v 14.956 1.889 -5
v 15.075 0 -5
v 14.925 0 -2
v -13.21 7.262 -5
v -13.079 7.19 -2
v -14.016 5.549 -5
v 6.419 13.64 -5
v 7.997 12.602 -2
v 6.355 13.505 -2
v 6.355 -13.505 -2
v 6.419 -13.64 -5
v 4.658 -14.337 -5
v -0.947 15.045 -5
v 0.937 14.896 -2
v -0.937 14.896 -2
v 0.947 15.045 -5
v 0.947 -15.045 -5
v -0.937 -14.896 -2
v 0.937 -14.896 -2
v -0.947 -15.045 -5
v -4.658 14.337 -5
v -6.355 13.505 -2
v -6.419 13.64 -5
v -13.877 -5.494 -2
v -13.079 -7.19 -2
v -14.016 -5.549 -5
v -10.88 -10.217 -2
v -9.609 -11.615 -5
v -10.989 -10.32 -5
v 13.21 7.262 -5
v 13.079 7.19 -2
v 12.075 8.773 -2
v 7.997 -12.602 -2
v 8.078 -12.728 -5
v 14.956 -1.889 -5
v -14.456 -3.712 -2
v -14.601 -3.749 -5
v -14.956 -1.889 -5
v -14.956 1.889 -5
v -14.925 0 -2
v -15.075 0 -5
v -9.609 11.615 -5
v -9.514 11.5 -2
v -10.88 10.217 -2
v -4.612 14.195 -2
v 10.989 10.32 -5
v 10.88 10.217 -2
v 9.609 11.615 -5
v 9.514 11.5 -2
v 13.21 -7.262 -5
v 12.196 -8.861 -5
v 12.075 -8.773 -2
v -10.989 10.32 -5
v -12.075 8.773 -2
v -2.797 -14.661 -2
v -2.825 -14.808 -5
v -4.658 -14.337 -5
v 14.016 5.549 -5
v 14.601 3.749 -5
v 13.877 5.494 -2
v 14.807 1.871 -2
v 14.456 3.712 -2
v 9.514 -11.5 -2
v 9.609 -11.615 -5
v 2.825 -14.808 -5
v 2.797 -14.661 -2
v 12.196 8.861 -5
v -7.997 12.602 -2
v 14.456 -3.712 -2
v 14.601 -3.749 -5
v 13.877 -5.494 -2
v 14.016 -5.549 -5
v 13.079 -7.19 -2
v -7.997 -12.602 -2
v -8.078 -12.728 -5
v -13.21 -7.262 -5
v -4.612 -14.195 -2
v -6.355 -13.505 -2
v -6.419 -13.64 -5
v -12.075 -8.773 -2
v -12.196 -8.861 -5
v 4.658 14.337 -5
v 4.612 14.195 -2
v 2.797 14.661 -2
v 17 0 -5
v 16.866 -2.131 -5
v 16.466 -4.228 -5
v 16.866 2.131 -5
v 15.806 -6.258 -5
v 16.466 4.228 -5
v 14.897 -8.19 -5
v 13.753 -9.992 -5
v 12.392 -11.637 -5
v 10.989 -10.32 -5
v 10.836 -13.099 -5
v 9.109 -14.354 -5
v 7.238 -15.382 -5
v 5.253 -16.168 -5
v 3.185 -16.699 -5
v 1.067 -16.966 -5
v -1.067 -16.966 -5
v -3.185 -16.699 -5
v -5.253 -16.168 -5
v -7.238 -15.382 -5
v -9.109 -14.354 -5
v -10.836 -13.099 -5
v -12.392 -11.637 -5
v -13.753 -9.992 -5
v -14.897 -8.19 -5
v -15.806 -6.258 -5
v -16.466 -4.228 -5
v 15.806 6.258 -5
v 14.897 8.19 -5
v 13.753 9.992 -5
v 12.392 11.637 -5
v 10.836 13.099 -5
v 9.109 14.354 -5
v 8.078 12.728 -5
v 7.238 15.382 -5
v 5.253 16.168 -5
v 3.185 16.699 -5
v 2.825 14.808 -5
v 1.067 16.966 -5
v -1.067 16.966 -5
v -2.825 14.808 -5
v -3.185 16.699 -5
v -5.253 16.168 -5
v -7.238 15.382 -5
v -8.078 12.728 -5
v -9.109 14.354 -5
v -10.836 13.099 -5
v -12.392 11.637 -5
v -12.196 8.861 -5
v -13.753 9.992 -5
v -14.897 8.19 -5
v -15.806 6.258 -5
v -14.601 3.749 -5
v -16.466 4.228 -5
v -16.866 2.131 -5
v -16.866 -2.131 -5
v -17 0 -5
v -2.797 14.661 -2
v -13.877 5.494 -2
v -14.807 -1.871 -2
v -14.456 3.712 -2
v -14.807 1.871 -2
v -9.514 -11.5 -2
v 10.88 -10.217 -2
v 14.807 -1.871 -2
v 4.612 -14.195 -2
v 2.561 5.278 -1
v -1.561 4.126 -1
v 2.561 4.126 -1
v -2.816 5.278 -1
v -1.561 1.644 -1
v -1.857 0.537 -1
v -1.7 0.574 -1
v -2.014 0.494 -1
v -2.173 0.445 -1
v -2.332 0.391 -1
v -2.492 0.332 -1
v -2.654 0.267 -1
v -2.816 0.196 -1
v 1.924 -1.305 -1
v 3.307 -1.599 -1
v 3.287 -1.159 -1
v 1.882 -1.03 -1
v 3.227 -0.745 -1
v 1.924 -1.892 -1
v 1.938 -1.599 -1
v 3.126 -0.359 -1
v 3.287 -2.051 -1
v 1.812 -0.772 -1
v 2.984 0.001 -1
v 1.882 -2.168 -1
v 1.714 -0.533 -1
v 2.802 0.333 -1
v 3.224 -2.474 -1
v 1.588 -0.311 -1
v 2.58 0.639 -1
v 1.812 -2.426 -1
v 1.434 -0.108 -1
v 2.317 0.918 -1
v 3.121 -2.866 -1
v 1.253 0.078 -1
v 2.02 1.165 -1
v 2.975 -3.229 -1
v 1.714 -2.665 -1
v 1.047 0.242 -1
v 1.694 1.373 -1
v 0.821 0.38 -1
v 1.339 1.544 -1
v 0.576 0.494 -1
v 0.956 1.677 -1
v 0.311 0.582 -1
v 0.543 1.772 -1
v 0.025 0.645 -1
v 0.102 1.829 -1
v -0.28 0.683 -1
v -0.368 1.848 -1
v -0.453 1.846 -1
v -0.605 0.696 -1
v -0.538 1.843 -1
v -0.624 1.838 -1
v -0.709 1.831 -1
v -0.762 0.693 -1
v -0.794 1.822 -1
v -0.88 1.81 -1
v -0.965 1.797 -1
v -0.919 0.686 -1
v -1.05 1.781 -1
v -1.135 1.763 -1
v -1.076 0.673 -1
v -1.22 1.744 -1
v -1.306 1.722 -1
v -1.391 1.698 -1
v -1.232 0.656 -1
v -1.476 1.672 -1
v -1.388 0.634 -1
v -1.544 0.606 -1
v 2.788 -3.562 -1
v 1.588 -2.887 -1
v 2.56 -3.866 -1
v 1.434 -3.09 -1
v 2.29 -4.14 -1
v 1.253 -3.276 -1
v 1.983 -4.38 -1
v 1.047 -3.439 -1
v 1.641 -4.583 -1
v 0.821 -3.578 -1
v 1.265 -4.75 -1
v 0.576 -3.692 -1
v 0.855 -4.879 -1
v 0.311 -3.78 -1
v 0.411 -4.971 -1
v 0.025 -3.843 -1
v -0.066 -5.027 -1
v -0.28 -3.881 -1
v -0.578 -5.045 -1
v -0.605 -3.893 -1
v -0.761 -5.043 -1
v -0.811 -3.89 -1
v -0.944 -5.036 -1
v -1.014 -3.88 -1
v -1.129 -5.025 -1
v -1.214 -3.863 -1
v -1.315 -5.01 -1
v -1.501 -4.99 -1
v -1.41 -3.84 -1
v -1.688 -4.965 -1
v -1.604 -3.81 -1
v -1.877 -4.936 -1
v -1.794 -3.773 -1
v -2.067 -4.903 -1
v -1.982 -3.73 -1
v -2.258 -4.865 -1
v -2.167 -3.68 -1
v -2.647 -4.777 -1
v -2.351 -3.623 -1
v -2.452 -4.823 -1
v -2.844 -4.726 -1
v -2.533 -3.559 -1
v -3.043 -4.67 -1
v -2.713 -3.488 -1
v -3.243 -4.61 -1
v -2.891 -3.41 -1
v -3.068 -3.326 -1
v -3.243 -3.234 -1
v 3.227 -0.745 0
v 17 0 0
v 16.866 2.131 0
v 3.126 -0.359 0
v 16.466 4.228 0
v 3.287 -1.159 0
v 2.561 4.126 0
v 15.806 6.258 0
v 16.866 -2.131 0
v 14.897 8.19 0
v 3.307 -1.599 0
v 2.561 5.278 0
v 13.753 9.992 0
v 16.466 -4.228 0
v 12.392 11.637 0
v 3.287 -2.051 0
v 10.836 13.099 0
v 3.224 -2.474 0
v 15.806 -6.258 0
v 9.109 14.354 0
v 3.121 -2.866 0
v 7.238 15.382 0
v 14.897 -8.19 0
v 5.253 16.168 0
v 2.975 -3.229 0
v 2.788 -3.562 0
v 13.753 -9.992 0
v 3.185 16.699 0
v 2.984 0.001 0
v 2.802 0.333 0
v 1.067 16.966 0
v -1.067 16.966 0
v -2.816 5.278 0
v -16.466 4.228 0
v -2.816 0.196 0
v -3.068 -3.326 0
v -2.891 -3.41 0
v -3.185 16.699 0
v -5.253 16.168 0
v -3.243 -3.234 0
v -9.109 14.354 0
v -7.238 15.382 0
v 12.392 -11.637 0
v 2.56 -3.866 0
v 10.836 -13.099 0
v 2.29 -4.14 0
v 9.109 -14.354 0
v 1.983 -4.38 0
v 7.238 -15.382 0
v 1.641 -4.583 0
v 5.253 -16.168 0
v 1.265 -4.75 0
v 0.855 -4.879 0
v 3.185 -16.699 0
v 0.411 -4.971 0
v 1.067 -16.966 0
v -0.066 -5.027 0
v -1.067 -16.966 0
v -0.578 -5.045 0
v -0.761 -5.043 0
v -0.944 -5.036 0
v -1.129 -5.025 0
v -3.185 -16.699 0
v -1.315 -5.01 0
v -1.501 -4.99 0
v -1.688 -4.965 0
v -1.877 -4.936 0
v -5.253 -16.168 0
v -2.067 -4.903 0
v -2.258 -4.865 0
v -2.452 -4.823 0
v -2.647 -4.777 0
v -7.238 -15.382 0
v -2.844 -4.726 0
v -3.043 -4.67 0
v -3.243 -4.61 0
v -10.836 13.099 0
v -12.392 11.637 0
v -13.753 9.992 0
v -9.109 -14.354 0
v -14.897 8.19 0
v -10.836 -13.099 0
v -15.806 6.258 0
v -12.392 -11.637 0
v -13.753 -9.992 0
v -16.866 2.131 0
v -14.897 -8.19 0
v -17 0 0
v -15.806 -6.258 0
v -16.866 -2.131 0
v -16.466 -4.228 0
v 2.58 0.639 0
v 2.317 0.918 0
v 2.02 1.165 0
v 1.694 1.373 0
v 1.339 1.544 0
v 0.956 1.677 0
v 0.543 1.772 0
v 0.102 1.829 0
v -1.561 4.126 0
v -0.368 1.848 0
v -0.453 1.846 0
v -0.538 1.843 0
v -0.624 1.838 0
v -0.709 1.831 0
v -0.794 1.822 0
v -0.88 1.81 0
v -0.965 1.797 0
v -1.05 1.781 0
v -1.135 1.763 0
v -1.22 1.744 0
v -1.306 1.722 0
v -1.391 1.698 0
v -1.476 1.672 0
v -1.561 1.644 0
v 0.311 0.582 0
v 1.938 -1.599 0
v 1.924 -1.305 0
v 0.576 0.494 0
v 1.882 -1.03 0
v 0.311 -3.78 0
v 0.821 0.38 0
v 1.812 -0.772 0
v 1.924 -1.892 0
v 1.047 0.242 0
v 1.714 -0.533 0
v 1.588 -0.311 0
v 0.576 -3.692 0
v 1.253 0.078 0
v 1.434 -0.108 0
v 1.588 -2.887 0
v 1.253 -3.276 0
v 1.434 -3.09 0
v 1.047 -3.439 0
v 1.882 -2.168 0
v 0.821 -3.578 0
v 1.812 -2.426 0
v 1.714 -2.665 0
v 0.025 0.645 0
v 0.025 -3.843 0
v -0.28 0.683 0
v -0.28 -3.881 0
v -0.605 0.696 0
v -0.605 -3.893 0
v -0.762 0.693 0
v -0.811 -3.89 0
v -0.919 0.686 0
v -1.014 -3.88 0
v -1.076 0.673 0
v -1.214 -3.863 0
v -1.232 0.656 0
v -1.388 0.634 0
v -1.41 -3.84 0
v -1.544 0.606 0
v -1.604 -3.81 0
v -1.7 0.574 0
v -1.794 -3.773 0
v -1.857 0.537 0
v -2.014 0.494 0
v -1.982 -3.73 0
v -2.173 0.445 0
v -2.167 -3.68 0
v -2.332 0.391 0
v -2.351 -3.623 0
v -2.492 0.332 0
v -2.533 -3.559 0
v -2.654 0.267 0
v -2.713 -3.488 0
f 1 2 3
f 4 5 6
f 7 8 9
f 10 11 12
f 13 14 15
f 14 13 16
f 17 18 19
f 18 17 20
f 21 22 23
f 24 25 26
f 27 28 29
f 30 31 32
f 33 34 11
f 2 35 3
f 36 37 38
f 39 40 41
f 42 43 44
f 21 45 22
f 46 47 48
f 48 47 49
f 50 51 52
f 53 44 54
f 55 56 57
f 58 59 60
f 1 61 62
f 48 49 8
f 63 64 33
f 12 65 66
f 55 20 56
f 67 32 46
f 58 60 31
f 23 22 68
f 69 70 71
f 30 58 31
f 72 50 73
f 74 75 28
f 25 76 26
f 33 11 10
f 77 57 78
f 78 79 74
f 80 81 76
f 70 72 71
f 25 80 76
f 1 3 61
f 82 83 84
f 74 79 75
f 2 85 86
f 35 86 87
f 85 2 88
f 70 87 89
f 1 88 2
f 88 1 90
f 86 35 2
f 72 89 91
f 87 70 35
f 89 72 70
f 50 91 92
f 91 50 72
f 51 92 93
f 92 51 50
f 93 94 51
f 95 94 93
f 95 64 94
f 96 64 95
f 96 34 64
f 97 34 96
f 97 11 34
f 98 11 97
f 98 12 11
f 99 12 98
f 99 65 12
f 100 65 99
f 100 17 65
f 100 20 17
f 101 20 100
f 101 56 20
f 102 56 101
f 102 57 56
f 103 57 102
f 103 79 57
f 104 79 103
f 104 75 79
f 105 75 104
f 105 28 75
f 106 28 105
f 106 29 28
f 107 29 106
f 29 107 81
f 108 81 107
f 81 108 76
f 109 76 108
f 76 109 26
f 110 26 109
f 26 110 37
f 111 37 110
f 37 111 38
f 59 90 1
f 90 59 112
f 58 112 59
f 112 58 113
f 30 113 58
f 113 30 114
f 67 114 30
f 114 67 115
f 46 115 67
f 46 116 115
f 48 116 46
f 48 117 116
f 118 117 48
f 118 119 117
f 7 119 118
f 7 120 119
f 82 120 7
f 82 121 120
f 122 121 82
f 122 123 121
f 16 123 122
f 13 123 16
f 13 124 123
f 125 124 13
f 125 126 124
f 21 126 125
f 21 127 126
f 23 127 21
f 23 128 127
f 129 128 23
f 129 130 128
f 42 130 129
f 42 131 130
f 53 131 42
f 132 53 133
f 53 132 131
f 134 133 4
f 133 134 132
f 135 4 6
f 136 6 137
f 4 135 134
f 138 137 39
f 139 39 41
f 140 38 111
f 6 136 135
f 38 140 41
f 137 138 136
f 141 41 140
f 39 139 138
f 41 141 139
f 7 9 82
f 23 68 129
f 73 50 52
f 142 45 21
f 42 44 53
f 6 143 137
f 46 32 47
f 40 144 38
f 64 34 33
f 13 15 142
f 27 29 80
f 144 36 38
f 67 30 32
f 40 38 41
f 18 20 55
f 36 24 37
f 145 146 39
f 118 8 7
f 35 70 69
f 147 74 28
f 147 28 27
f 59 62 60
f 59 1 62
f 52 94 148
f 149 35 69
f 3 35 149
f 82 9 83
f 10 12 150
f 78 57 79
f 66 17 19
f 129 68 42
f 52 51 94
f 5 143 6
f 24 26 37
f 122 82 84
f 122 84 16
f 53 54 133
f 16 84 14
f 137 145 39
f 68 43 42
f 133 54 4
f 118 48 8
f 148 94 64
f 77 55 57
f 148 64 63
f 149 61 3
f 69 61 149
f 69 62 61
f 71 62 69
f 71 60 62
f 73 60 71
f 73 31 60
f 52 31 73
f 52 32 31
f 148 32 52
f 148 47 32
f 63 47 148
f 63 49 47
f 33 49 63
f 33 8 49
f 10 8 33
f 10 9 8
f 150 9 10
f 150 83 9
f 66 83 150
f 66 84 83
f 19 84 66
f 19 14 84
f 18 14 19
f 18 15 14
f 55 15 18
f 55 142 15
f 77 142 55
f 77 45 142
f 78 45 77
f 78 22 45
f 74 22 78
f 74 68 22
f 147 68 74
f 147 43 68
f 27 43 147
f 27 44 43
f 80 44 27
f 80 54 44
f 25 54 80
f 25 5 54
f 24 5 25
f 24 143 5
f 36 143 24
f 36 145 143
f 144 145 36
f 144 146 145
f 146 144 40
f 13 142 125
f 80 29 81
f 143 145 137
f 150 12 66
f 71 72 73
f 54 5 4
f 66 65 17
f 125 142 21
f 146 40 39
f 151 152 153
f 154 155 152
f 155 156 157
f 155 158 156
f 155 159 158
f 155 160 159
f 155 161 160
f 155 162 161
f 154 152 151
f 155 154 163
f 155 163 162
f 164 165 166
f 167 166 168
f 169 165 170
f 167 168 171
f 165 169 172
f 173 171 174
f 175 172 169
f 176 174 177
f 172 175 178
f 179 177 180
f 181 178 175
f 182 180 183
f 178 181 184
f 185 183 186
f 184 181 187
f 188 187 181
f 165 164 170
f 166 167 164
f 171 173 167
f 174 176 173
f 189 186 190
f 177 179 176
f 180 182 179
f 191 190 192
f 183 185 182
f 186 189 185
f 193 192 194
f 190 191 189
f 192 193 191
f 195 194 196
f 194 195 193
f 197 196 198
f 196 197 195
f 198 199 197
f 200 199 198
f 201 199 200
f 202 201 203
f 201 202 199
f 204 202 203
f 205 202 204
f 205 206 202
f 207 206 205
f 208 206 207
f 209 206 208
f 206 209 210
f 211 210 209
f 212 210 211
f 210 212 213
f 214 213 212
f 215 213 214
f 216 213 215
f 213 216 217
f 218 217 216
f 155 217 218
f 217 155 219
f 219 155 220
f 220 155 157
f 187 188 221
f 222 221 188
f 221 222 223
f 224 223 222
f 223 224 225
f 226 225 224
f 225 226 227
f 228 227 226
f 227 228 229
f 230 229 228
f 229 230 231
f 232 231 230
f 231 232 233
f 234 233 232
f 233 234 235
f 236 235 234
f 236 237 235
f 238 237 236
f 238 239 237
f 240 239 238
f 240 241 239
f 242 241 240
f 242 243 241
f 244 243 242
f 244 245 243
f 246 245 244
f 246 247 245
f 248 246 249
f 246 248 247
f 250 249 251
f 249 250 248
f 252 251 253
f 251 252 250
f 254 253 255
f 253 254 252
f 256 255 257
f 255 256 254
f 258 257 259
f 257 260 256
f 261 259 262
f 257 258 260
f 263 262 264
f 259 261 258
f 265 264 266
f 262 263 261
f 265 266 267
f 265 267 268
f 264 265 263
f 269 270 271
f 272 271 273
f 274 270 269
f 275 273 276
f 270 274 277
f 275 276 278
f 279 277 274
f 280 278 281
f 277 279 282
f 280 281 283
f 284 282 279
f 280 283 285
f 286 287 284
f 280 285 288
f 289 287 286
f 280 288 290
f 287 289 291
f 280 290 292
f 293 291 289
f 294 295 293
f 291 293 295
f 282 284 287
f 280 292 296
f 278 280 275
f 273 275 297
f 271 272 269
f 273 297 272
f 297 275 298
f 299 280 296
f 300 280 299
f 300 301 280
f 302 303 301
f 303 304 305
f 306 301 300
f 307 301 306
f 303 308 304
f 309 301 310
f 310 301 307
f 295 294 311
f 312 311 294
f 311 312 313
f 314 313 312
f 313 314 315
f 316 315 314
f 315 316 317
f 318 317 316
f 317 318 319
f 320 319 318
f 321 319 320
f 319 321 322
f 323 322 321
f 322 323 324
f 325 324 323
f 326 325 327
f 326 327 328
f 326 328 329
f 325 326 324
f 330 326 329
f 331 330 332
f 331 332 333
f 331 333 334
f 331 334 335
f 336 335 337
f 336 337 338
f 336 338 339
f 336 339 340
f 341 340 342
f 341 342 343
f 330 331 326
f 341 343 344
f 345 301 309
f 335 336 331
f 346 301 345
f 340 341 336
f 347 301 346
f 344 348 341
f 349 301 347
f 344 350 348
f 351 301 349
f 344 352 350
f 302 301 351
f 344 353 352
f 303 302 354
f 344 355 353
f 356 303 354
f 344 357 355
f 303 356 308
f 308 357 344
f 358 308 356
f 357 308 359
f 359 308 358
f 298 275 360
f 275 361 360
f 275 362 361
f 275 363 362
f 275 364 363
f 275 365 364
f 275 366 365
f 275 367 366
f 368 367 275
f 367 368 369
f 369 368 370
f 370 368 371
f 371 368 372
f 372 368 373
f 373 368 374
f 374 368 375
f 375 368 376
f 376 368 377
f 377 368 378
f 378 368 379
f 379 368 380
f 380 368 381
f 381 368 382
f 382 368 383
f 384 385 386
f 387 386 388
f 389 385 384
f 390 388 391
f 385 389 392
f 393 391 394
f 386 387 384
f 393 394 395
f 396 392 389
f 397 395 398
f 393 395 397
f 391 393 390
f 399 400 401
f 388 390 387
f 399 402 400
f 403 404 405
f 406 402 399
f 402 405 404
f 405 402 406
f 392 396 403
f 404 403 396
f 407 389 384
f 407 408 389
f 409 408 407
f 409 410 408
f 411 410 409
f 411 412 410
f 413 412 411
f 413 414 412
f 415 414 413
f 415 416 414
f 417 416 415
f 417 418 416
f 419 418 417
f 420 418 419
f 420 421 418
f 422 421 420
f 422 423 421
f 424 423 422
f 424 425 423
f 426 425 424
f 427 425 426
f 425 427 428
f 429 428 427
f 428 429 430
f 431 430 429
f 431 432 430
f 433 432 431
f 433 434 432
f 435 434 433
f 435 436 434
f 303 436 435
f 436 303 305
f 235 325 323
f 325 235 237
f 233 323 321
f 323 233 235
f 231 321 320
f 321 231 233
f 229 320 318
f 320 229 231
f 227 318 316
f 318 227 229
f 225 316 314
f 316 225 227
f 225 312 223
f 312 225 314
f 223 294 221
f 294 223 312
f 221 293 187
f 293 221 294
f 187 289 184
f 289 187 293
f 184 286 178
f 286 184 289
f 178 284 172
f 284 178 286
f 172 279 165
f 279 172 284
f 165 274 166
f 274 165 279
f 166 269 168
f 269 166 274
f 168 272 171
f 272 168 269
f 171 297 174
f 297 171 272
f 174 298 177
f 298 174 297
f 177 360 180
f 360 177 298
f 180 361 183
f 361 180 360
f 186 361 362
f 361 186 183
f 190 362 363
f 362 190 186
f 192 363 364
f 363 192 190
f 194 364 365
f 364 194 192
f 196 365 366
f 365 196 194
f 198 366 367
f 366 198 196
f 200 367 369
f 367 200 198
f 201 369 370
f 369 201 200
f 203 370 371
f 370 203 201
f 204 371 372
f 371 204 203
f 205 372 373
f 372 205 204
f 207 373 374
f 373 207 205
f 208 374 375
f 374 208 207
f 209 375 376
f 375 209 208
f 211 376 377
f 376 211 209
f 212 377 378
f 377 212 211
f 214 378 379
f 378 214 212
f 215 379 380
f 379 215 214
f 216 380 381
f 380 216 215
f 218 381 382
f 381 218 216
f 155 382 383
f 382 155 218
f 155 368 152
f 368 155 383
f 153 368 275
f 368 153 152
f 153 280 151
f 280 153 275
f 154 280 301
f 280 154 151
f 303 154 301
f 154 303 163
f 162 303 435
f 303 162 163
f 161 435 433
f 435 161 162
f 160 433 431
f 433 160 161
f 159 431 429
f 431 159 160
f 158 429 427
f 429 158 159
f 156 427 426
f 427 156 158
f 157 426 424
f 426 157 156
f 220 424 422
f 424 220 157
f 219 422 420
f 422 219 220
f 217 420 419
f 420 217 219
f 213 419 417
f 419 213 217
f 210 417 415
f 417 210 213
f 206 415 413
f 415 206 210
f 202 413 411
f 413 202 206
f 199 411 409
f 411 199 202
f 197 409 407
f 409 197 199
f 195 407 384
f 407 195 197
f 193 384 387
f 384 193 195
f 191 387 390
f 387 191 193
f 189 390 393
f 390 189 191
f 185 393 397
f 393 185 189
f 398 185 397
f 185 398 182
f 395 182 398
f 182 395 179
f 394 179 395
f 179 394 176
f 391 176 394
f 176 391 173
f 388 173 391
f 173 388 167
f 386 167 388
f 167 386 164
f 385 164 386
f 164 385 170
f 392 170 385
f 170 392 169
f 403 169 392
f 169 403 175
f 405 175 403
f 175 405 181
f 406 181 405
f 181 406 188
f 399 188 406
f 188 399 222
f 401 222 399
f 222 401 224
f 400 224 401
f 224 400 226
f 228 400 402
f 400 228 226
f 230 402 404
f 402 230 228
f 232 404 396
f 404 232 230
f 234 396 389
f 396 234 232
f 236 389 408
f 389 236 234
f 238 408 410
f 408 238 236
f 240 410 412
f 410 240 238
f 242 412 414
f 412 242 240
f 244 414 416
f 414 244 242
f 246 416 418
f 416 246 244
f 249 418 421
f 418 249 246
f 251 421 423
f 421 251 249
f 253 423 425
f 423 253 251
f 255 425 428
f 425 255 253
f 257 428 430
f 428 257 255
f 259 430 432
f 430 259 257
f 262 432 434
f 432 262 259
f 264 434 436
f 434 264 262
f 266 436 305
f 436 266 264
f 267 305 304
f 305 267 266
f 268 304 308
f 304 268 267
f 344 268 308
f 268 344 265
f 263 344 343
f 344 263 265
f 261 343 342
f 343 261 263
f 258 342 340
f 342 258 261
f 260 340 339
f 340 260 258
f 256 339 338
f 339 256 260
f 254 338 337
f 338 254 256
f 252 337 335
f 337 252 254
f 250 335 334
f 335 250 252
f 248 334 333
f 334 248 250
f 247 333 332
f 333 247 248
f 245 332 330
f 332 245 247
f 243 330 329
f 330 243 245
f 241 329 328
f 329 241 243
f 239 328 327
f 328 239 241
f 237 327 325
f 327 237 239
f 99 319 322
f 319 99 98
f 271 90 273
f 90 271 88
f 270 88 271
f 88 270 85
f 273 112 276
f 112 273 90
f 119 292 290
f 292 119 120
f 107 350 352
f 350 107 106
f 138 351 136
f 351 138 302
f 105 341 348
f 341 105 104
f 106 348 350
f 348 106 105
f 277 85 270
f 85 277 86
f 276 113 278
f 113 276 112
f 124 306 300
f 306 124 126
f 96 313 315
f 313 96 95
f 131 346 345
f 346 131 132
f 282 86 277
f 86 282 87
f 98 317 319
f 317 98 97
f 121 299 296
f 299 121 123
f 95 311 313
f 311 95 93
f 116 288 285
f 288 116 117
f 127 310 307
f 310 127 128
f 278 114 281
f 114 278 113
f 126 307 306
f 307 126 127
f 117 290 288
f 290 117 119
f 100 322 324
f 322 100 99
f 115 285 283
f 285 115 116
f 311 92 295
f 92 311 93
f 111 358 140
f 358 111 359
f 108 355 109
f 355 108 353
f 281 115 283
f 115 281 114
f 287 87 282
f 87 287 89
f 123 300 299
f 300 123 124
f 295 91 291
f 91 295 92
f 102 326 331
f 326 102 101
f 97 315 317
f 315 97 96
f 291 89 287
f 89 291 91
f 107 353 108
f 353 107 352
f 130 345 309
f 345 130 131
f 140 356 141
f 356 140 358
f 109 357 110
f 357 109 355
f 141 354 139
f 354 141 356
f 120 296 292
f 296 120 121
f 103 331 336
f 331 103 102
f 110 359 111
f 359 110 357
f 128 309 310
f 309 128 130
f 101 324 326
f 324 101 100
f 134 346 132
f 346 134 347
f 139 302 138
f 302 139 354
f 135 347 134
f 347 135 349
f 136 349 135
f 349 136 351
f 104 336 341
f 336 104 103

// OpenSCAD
$fn = 50;

difference() {
	union() {
		translate(v = [0, 0, -5.0]) {
			cylinder(h = 5, r = 17.0);
		}
	}
	union() {
		#translate(v = [0, 0, -5.0]) {
			cylinder(h = 3, r1 = 15.075, r2 = 14.925);
		}
		translate(v = [0, 0, -1]) {
			linear_extrude(height = 1) {
				text(font = "Impact", halign = "center", size = 10, text = "5", valign = "center");
			}
		}
	}
}
